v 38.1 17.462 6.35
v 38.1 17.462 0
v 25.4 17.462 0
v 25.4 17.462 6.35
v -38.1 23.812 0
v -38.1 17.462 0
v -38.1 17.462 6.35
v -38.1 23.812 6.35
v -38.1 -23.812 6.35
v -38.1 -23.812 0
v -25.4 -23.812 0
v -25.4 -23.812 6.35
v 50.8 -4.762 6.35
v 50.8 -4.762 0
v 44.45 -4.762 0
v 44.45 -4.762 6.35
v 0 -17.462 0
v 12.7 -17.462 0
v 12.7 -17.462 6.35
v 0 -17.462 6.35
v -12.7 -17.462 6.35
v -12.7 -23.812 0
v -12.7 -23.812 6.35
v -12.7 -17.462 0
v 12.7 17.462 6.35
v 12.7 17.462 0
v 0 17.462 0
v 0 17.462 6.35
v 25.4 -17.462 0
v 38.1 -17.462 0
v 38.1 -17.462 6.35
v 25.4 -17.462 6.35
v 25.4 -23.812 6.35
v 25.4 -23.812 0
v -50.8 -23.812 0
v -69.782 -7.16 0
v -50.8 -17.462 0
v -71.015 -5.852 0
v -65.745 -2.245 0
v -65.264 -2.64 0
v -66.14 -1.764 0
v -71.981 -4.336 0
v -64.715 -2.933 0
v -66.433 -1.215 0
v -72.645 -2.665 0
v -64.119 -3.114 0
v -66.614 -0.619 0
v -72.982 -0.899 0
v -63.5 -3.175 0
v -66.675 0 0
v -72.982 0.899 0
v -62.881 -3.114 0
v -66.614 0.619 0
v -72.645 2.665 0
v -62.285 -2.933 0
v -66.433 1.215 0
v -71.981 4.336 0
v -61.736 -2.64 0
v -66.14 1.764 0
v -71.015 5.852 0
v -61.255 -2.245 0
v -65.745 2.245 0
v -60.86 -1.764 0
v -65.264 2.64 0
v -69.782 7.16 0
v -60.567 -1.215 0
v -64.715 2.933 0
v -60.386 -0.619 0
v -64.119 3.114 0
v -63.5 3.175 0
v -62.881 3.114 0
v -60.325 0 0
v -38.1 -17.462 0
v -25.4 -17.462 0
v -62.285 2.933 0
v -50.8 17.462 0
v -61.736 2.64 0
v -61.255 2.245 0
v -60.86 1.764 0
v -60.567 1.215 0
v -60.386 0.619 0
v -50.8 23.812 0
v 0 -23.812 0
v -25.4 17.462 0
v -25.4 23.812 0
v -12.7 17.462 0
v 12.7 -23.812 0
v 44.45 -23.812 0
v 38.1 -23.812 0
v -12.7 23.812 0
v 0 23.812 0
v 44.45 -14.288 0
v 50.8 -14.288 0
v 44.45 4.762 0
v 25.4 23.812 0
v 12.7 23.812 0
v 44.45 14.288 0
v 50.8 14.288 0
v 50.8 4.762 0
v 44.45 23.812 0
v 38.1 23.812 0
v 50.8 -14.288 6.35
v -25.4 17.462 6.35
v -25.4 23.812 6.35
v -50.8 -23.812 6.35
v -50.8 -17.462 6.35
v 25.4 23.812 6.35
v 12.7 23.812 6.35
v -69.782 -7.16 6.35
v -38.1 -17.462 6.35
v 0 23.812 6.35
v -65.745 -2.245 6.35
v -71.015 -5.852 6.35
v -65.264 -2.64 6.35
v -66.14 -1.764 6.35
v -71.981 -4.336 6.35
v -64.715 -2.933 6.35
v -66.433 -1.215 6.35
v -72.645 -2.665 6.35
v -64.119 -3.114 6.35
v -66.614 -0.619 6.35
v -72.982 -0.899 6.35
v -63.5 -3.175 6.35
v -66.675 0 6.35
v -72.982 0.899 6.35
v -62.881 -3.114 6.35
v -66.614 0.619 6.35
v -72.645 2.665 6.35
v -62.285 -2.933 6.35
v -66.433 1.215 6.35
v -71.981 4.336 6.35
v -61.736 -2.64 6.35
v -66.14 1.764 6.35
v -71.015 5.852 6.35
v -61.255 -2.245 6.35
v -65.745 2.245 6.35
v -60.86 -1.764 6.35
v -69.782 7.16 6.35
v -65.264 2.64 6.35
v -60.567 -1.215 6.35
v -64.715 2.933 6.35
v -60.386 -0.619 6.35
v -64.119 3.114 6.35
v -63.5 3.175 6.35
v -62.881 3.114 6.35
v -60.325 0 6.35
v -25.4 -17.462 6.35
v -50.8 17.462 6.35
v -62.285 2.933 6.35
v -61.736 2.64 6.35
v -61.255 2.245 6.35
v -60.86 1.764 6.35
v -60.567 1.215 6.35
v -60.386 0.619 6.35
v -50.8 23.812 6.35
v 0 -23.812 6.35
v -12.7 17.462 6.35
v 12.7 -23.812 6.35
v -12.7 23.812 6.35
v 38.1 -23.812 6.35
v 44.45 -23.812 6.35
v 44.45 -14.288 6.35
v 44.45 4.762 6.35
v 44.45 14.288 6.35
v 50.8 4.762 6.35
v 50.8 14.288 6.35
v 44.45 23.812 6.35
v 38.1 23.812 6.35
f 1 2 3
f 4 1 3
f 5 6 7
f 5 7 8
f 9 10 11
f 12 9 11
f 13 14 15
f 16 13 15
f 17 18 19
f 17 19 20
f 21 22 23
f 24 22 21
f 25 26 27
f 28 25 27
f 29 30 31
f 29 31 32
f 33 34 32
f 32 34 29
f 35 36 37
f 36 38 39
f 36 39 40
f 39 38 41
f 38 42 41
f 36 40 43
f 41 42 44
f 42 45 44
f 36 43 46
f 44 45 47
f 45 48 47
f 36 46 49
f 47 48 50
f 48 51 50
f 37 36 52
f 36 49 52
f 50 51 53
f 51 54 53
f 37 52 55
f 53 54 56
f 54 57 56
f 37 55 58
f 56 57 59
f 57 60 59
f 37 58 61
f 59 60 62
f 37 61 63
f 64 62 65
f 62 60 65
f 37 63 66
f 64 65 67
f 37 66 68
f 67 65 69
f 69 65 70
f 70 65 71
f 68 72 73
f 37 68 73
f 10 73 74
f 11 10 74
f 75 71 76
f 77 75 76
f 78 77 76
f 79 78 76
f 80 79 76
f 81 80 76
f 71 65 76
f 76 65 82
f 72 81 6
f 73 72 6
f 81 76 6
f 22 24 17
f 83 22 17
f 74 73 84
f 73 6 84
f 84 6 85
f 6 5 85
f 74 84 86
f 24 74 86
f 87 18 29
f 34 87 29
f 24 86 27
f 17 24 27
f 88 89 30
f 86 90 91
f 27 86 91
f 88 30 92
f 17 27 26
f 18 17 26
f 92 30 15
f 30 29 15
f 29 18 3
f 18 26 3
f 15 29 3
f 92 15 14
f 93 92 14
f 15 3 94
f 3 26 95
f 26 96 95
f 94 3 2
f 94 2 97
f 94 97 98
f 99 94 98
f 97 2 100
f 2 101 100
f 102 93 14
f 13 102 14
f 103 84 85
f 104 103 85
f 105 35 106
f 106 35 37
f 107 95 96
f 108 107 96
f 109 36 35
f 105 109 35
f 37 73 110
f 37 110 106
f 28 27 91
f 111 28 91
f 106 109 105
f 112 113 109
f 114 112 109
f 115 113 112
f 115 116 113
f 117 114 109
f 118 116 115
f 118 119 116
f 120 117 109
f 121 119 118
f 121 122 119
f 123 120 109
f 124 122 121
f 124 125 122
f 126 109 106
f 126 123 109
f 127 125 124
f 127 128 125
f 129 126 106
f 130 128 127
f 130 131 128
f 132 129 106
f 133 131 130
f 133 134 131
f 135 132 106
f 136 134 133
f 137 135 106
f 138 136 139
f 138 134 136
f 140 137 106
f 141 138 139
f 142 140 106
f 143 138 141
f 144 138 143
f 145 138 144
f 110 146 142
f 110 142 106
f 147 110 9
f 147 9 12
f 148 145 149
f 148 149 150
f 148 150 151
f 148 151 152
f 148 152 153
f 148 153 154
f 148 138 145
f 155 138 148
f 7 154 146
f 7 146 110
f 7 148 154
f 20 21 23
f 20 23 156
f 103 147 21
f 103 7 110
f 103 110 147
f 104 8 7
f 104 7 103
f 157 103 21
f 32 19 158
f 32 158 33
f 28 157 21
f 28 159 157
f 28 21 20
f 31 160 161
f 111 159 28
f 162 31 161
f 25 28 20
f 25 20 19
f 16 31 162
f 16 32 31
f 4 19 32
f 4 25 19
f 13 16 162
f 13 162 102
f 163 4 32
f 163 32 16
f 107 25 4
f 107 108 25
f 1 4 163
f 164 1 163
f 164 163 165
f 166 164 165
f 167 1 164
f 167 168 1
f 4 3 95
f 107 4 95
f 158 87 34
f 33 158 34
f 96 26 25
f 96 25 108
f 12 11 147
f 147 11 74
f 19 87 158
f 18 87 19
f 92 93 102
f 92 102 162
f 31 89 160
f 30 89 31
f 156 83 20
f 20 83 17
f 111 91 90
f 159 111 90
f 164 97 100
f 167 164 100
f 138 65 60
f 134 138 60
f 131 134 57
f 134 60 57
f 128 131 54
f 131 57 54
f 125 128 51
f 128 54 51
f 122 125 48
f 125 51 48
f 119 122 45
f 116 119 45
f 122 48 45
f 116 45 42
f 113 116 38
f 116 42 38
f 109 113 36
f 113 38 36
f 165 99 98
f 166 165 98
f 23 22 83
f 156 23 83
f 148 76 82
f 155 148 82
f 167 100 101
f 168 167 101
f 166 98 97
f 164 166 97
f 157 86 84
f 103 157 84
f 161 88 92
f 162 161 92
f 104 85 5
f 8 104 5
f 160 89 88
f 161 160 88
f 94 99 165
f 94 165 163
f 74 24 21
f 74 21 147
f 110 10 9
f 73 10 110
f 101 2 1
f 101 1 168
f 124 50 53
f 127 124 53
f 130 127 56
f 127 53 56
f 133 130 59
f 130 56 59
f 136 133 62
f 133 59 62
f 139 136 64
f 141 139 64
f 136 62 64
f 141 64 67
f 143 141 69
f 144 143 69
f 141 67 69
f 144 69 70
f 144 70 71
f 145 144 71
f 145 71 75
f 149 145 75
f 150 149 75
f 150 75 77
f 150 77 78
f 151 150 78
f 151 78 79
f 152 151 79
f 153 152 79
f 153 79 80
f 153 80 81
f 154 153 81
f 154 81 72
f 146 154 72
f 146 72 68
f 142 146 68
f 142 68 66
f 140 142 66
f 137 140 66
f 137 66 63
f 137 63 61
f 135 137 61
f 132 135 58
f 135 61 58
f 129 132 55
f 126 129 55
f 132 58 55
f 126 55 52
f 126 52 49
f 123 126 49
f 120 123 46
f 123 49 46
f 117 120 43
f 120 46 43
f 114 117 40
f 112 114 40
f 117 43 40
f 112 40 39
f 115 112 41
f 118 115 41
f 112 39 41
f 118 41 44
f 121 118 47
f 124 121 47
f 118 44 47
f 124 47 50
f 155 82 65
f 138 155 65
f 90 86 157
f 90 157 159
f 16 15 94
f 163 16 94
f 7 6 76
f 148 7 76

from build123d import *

# Parameters (mm, degrees)
MASS_DEPTH          = 6.35
SKETCH4_R           = 3.175
CUT_EXTRUDE1_DEPTH  = 78.071449197
SKETCH3_W           = 12.7
SKETCH3_H           = 12.7
CUT_EXTRUDE2_DEPTH  = 78.071449197
LPATTERN1_COUNT     = 4
LPATTERN1_PITCH     = 25.4
SKETCH5_W           = 12.7
SKETCH5_H           = 9.525
CUT_EXTRUDE3_DEPTH  = 78.071449197
LPATTERN2_COUNT     = 2
LPATTERN2_PITCH     = 19.05
LPATTERN2_COL_COUNT = 2
LPATTERN2_COL_PITCH = 19.05


with BuildPart() as part:
    # Sketch1 → Mass (new body)
    with BuildSketch(Plane.XY):
        with BuildLine():
            Line((-50.8, -23.8125), (50.8, -23.8125))
            Line((50.8, -23.8125), (50.8, 23.8125))
            Line((50.8, 23.8125), (-50.8, 23.8125))
            Line((-50.8, 23.8125), (-69.781543236, 7.160156393))
            ThreePointArc((-69.781543236, 7.160156393), (-73.025, 0), (-69.781543236, -7.160156393))
            Line((-69.781543236, -7.160156393), (-50.8, -23.8125))
        make_face()
    extrude(amount=MASS_DEPTH)

    # Sketch4 → Cut-Extrude1 (cut, through all)
    with BuildSketch(Plane(origin=(0, 0, 0), x_dir=(-1, 0, 0), z_dir=(0, 0, -1))):
        with Locations((63.5, 0)):
            Circle(SKETCH4_R)
    extrude(amount=-CUT_EXTRUDE1_DEPTH, mode=Mode.SUBTRACT)

    # Sketch3 → Cut-Extrude2 (cut, through all)
    with BuildSketch(Plane(origin=(0, 0, 0), x_dir=(-1, 0, 0), z_dir=(0, 0, -1))):
        with Locations((-31.75, 23.8125)):
            Rectangle(SKETCH3_W, SKETCH3_H)
        with Locations((-31.75, -23.8125)):
            Rectangle(SKETCH3_W, SKETCH3_H)
    cut_extrude2 = extrude(amount=-CUT_EXTRUDE2_DEPTH, mode=Mode.SUBTRACT)

    # LPattern1: Cut-Extrude2 ×4
    with Locations(*[(-i * LPATTERN1_PITCH, 0, 0) for i in range(1, LPATTERN1_COUNT)]):
        add(cut_extrude2, mode=Mode.SUBTRACT)

    # Sketch5 → Cut-Extrude3 (cut, through all)
    with BuildSketch(Plane(origin=(0, 0, 0), x_dir=(-1, 0, 0), z_dir=(0, 0, -1))):
        with Locations((-50.8, 0)):
            Rectangle(SKETCH5_W, SKETCH5_H)
    cut_extrude3 = extrude(amount=-CUT_EXTRUDE3_DEPTH, mode=Mode.SUBTRACT)

    # LPattern2: Cut-Extrude3 ×2
    with Locations(*[(0, -i * LPATTERN2_PITCH, 0) for i in range(1, LPATTERN2_COUNT)]):
        add(cut_extrude3, mode=Mode.SUBTRACT)

    # LPattern2 col: Cut-Extrude3 ×2
    with Locations(*[(0, i * LPATTERN2_COL_PITCH, 0) for i in range(1, LPATTERN2_COL_COUNT)]):
        add(cut_extrude3, mode=Mode.SUBTRACT)


solid = part.part
